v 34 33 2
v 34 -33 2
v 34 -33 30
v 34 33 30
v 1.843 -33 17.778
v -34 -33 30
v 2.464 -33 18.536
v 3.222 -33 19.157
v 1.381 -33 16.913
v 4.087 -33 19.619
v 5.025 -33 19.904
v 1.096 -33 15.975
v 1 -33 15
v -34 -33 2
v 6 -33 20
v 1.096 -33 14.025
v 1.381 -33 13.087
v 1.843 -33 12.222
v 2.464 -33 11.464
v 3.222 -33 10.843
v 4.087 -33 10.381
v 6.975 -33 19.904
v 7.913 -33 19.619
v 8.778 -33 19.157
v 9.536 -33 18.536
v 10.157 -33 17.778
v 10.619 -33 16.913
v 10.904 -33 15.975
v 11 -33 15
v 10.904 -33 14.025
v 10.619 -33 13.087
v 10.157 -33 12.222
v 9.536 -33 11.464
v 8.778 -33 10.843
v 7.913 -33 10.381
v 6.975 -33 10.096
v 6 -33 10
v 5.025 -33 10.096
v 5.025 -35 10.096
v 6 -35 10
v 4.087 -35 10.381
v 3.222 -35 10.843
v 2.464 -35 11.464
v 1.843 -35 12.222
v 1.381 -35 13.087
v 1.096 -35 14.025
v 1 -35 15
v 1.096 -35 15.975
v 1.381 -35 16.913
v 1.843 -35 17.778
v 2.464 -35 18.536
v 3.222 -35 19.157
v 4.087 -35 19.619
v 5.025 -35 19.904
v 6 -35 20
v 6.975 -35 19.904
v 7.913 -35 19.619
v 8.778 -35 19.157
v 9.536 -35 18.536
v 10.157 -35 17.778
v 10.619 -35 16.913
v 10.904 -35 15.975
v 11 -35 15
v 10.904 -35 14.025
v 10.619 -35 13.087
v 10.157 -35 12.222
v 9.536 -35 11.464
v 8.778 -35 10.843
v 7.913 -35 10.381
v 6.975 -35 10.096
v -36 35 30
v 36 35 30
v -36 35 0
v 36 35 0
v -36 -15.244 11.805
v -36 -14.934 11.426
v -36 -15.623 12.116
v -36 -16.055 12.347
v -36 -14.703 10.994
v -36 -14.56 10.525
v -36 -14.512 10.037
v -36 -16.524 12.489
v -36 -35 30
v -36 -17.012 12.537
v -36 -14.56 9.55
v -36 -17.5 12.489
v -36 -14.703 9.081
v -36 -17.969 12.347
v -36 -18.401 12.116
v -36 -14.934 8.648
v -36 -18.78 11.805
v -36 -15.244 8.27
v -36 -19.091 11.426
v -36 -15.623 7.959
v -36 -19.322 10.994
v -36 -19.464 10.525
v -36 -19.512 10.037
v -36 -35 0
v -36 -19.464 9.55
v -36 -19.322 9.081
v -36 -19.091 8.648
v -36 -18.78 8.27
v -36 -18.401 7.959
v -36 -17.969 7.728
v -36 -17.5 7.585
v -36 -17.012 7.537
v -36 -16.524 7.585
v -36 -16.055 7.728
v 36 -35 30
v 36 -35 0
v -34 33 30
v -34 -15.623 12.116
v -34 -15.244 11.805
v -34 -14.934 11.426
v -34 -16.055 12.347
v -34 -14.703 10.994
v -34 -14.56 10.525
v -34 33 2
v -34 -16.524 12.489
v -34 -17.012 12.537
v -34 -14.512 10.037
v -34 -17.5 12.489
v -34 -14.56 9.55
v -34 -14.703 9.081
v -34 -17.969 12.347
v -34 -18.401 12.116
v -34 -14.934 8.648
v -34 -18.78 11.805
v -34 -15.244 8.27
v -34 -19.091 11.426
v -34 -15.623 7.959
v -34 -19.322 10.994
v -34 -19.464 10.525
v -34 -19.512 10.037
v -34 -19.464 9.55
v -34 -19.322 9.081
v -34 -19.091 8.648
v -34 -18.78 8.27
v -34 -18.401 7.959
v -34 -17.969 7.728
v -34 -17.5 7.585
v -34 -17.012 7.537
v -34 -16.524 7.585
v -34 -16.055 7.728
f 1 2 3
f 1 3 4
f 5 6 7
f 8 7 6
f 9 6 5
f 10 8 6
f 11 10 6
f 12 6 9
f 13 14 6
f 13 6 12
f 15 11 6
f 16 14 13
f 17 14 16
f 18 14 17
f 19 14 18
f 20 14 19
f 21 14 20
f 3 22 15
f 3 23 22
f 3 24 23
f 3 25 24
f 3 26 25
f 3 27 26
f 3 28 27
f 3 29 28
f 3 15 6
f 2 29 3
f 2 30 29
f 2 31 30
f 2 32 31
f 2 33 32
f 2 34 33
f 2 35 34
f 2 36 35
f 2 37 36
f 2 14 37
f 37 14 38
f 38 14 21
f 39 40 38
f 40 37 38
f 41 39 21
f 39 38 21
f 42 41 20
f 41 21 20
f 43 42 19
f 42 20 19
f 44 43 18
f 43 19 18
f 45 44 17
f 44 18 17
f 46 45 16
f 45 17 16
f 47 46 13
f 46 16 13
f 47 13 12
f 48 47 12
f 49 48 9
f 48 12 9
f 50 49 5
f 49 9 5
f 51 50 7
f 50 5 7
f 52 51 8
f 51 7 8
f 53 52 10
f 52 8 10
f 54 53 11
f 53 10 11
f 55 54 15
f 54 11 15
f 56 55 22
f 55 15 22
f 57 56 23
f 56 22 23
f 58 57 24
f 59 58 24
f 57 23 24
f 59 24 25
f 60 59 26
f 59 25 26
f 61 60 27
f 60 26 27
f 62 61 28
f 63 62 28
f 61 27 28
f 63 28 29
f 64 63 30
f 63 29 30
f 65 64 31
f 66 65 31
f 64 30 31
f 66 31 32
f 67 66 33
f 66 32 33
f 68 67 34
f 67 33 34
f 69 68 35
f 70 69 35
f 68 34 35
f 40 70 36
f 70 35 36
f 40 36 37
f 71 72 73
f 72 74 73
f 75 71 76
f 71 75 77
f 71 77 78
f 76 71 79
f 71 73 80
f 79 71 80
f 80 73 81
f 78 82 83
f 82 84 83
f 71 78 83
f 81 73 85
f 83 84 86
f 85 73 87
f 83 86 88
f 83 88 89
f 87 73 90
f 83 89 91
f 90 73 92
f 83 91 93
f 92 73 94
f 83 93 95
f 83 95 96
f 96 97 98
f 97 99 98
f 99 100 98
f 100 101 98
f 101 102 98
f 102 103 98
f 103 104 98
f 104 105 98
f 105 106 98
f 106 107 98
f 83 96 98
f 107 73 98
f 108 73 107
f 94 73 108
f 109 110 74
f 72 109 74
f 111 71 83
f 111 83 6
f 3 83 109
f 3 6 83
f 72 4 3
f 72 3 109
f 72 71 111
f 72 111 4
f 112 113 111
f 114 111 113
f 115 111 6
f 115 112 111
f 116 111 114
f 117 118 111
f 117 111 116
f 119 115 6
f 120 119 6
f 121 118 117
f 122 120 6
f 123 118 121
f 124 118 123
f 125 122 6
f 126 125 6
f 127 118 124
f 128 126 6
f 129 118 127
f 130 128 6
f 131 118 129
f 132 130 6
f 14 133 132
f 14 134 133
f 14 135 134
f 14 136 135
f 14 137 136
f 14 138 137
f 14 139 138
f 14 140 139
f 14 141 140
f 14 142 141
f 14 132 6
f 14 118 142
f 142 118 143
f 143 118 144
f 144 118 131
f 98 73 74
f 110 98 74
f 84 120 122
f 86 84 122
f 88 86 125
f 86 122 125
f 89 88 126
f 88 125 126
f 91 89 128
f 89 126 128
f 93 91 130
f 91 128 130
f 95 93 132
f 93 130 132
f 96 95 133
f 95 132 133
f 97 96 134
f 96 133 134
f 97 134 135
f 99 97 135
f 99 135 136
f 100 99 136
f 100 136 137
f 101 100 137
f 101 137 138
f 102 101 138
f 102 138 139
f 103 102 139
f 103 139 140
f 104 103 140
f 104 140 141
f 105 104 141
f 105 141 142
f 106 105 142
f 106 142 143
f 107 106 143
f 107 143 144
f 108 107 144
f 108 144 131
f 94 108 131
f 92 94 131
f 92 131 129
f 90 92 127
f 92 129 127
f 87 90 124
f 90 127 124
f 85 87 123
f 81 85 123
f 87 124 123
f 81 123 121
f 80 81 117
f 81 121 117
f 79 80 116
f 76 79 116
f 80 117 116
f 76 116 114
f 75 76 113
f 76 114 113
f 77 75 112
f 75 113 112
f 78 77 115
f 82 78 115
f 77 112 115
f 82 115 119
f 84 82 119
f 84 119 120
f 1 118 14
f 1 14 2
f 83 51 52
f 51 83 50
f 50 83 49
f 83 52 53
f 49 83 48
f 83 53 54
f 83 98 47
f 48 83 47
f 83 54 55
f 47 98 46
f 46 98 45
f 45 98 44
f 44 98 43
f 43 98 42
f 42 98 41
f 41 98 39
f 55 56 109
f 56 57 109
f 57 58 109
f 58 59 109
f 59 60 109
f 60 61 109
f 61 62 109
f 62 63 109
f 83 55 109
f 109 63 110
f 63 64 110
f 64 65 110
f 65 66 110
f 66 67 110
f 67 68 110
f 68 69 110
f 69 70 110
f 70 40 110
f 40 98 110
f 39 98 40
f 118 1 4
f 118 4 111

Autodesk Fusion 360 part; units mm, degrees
sketch "Sketch1" plane through (0, 0, 0) normal (0, 0, 1) x (1, 0, 0)
  line L0 (36, 35) -> (-36, 35)
  line L1 (-36, 35) -> (-36, -35)
  line L2 (-36, -35) -> (36, -35)
  line L3 (36, -35) -> (36, 35)
  line L4 (36, 35) -> (-36, -35) construction
  line L5 (-36, 35) -> (36, -35) construction
  dimension "d1" = 72
  dimension "d2" = 70
extrude "Extrude1" add sketch "Sketch1" along normal blind 30
shell "Shell1" thickness 2 removed faces 1 at (-12, 11.6667, 30)
sketch "Sketch2" plane through (-36, 0, 0) normal (-1, 0, 0) x (0, -1, 0)
  line L0 (-35, 0) -> (35, 0)
  line L1 (35, 0) -> (35, 30)
  line L2 (35, 30) -> (-35, 30)
  line L3 (-35, 30) -> (-35, 0)
  line L4 (35, 0) -> (17, 0)
  line L5 (17, 0) -> (17, 10)
  dimension "d11" = 18
  dimension "d12" = 10
hole "Hole2" at (-36, -17.0122, 10.0373) direction (1, 0, 0) diameter 5 depth 2 tip angle 118
sketch "Sketch3" plane through (0, -35, 0) normal (0, -1, 0) x (1, 0, 0)
  line L0 (-36, 0) -> (36, 0)
  line L1 (36, 0) -> (36, 30)
  line L2 (36, 30) -> (-36, 30)
  line L3 (-36, 30) -> (-36, 0)
hole "Hole3" at (6, -35, 15) direction (0, 1, 0) diameter 10 depth 2 tip angle 118
